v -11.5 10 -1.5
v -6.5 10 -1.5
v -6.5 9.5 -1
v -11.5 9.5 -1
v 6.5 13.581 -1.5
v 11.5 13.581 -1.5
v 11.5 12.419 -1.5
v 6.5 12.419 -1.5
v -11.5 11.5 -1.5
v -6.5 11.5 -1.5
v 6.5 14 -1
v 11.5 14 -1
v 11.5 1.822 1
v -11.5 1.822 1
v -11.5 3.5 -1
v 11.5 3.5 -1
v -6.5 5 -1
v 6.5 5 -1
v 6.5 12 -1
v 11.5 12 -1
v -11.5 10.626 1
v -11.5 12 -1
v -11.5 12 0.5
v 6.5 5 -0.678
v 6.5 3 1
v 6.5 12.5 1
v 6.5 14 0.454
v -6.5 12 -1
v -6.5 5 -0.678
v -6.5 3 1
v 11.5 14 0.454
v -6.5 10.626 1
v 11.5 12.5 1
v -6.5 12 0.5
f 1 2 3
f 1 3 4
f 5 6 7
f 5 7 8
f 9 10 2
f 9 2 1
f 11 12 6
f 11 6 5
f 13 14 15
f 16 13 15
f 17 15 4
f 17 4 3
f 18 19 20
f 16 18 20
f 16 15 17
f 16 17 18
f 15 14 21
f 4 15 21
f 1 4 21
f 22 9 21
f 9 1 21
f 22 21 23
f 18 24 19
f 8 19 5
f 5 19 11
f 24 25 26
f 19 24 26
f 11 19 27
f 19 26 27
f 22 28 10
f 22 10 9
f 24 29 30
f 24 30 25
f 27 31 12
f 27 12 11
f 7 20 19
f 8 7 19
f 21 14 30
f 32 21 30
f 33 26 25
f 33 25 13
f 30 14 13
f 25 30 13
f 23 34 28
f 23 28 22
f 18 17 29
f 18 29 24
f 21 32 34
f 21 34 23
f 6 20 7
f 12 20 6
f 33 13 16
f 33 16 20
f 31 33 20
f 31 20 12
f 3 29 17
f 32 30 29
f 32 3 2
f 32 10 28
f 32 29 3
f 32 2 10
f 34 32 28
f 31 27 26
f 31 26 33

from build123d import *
from OCP.BRepFilletAPI import BRepFilletAPI_MakeChamfer

# Parameters (mm, degrees)
SKETCH_1_W          = 23
SKETCH_1_H          = 2
EXTRUDE_1_DEPTH     = 5
CHAMFER_1_SIZE      = 2
CHAMFER_1_SIZE2     = 1.678199262
SKETCH_2_W          = 5
SKETCH_2_H          = 2
EXTRUDE_2_DEPTH     = 14
CUT_EXTRUDE_1_DEPTH = 27.944387171
SKETCH_4_W          = 5
SKETCH_4_H          = 2
EXTRUDE_3_DEPTH     = 0.5
CHAMFER_3_SIZE      = 0.419549816
CHAMFER_3_SIZE_2    = 0.5
SKETCH_5_W          = 5
SKETCH_5_H          = 2
CUT_EXTRUDE_2_DEPTH = 19.227726134
CHAMFER_4_SIZE      = 1.5
CHAMFER_4_SIZE2     = 0.545955351
SKETCH_6_W          = 5
SKETCH_6_H          = 2
EXTRUDE_4_DEPTH     = 0.5
CHAMFER_5_SIZE      = 0.5
CHAMFER_6_SIZE      = 0.5
CHAMFER_6_SIZE2     = 1.37373871


with BuildPart() as part:
    # 草图1 → 凸台-拉伸1 (new body)
    with BuildSketch(Plane(origin=(0, 0, 0), x_dir=(1, 0, 0), z_dir=(0, 1, 0))):
        Rectangle(SKETCH_1_W, SKETCH_1_H)
    extrude(amount=EXTRUDE_1_DEPTH)

    # 倒角1
    chamfer_1_edges = [part.edges().sort_by_distance(p)[0] for p in [
        (0, 5, 1),
    ]]
    chamfer_1_side = [part.faces().sort_by_distance(p)[0] for p in [
        (0, 2.5, 1),
    ]]
    chamfer(chamfer_1_edges, length=CHAMFER_1_SIZE, length2=CHAMFER_1_SIZE2, reference=chamfer_1_side[0])

    # 草图2 → 凸台-拉伸2 (add)
    with BuildSketch(Plane(origin=(0, 0, 0), x_dir=(1, 0, 0), z_dir=(0, 1, 0))):
        with Locations((-9, 0)):
            Rectangle(SKETCH_2_W, SKETCH_2_H)
        with Locations((9, 0)):
            Rectangle(SKETCH_2_W, SKETCH_2_H)
    extrude(amount=EXTRUDE_2_DEPTH)

    # 草图3 → 切除-拉伸1 (cut, through all)
    with BuildSketch(Plane(origin=(11.5, 0, 0), x_dir=(0, 0, -1), z_dir=(1, 0, 0))):
        Polygon((-1, 1.821800738), (1, 3.5), (1, 0), (-1, 0), align=None)
    extrude(amount=-CUT_EXTRUDE_1_DEPTH, mode=Mode.SUBTRACT)

    # 草图4 → 凸台-拉伸3 (add)
    with BuildSketch(Plane(origin=(0, 0, -1), x_dir=(-1, 0, 0), z_dir=(0, 0, -1))):
        with Locations((-9, 13)):
            Rectangle(SKETCH_4_W, SKETCH_4_H)
    extrude(amount=EXTRUDE_3_DEPTH)

    # 倒角3
    chamfer_3_edges_1 = [part.edges().sort_by_distance(p)[0] for p in [
        (9, 12, -1.5),
    ]]
    chamfer_3_side_1 = [part.faces().sort_by_distance(p)[0] for p in [
        (9, 12.008390996, -1.5),
    ]]
    chamfer_3_edges_2 = [part.edges().sort_by_distance(p)[0] for p in [
        (9, 14, -1.5),
    ]]
    chamfer_3_side_2 = [part.faces().sort_by_distance(p)[0] for p in [
        (9, 13.991609004, -1.5),
    ]]
    chamfer_3 = BRepFilletAPI_MakeChamfer(part.part.solid().wrapped)
    for e in chamfer_3_edges_1:
        chamfer_3.Add(CHAMFER_3_SIZE - 0.0001, CHAMFER_3_SIZE_2 - 0.0001, e.wrapped, chamfer_3_side_1[0].wrapped)
    for e in chamfer_3_edges_2:
        chamfer_3.Add(CHAMFER_3_SIZE - 0.0001, CHAMFER_3_SIZE_2 - 0.0001, e.wrapped, chamfer_3_side_2[0].wrapped)
    add(Compound.cast(chamfer_3.Shape()), mode=Mode.REPLACE)  # a hair under: the kernel refuses the full size

    # 草图5 → 切除-拉伸2 (cut, through all)
    with BuildSketch(Plane(origin=(0, 0, -1), x_dir=(-1, 0, 0), z_dir=(0, 0, -1))):
        with Locations((9, 13)):
            Rectangle(SKETCH_5_W, SKETCH_5_H)
    extrude(amount=-CUT_EXTRUDE_2_DEPTH, mode=Mode.SUBTRACT)

    # 倒角4
    chamfer_4_edges = [part.edges().sort_by_distance(p)[0] for p in [
        (9, 14, 1),
    ]]
    chamfer_4_side = [part.faces().sort_by_distance(p)[0] for p in [
        (0, 2.082052258, 1),
    ]]
    chamfer(chamfer_4_edges, length=CHAMFER_4_SIZE, length2=CHAMFER_4_SIZE2, reference=chamfer_4_side[0])

    # 草图6 → 凸台-拉伸4 (add)
    with BuildSketch(Plane(origin=(0, 0, -1), x_dir=(-1, 0, 0), z_dir=(0, 0, -1))):
        with Locations((9, 11)):
            Rectangle(SKETCH_6_W, SKETCH_6_H)
    extrude(amount=EXTRUDE_4_DEPTH)

    # 倒角5
    chamfer_5_edges = [part.edges().sort_by_distance(p)[0] for p in [
        (-9, 10, -1),
    ]]
    chamfer(chamfer_5_edges, length=CHAMFER_5_SIZE - 0.0001)  # a hair under: the kernel refuses the full size
    chamfer_5_2_edges = [part.edges().sort_by_distance(p)[0] for p in [
        (-9, 12, -1.5),
    ]]
    chamfer(chamfer_5_2_edges, length=CHAMFER_5_SIZE)

    # 倒角6
    chamfer_6_edges = [part.edges().sort_by_distance(p)[0] for p in [
        (-9, 12, 1),
    ]]
    chamfer_6_side = [part.faces().sort_by_distance(p)[0] for p in [
        (-9, 12, 0),
    ]]
    chamfer(chamfer_6_edges, length=CHAMFER_6_SIZE, length2=CHAMFER_6_SIZE2, reference=chamfer_6_side[0])


solid = part.part
